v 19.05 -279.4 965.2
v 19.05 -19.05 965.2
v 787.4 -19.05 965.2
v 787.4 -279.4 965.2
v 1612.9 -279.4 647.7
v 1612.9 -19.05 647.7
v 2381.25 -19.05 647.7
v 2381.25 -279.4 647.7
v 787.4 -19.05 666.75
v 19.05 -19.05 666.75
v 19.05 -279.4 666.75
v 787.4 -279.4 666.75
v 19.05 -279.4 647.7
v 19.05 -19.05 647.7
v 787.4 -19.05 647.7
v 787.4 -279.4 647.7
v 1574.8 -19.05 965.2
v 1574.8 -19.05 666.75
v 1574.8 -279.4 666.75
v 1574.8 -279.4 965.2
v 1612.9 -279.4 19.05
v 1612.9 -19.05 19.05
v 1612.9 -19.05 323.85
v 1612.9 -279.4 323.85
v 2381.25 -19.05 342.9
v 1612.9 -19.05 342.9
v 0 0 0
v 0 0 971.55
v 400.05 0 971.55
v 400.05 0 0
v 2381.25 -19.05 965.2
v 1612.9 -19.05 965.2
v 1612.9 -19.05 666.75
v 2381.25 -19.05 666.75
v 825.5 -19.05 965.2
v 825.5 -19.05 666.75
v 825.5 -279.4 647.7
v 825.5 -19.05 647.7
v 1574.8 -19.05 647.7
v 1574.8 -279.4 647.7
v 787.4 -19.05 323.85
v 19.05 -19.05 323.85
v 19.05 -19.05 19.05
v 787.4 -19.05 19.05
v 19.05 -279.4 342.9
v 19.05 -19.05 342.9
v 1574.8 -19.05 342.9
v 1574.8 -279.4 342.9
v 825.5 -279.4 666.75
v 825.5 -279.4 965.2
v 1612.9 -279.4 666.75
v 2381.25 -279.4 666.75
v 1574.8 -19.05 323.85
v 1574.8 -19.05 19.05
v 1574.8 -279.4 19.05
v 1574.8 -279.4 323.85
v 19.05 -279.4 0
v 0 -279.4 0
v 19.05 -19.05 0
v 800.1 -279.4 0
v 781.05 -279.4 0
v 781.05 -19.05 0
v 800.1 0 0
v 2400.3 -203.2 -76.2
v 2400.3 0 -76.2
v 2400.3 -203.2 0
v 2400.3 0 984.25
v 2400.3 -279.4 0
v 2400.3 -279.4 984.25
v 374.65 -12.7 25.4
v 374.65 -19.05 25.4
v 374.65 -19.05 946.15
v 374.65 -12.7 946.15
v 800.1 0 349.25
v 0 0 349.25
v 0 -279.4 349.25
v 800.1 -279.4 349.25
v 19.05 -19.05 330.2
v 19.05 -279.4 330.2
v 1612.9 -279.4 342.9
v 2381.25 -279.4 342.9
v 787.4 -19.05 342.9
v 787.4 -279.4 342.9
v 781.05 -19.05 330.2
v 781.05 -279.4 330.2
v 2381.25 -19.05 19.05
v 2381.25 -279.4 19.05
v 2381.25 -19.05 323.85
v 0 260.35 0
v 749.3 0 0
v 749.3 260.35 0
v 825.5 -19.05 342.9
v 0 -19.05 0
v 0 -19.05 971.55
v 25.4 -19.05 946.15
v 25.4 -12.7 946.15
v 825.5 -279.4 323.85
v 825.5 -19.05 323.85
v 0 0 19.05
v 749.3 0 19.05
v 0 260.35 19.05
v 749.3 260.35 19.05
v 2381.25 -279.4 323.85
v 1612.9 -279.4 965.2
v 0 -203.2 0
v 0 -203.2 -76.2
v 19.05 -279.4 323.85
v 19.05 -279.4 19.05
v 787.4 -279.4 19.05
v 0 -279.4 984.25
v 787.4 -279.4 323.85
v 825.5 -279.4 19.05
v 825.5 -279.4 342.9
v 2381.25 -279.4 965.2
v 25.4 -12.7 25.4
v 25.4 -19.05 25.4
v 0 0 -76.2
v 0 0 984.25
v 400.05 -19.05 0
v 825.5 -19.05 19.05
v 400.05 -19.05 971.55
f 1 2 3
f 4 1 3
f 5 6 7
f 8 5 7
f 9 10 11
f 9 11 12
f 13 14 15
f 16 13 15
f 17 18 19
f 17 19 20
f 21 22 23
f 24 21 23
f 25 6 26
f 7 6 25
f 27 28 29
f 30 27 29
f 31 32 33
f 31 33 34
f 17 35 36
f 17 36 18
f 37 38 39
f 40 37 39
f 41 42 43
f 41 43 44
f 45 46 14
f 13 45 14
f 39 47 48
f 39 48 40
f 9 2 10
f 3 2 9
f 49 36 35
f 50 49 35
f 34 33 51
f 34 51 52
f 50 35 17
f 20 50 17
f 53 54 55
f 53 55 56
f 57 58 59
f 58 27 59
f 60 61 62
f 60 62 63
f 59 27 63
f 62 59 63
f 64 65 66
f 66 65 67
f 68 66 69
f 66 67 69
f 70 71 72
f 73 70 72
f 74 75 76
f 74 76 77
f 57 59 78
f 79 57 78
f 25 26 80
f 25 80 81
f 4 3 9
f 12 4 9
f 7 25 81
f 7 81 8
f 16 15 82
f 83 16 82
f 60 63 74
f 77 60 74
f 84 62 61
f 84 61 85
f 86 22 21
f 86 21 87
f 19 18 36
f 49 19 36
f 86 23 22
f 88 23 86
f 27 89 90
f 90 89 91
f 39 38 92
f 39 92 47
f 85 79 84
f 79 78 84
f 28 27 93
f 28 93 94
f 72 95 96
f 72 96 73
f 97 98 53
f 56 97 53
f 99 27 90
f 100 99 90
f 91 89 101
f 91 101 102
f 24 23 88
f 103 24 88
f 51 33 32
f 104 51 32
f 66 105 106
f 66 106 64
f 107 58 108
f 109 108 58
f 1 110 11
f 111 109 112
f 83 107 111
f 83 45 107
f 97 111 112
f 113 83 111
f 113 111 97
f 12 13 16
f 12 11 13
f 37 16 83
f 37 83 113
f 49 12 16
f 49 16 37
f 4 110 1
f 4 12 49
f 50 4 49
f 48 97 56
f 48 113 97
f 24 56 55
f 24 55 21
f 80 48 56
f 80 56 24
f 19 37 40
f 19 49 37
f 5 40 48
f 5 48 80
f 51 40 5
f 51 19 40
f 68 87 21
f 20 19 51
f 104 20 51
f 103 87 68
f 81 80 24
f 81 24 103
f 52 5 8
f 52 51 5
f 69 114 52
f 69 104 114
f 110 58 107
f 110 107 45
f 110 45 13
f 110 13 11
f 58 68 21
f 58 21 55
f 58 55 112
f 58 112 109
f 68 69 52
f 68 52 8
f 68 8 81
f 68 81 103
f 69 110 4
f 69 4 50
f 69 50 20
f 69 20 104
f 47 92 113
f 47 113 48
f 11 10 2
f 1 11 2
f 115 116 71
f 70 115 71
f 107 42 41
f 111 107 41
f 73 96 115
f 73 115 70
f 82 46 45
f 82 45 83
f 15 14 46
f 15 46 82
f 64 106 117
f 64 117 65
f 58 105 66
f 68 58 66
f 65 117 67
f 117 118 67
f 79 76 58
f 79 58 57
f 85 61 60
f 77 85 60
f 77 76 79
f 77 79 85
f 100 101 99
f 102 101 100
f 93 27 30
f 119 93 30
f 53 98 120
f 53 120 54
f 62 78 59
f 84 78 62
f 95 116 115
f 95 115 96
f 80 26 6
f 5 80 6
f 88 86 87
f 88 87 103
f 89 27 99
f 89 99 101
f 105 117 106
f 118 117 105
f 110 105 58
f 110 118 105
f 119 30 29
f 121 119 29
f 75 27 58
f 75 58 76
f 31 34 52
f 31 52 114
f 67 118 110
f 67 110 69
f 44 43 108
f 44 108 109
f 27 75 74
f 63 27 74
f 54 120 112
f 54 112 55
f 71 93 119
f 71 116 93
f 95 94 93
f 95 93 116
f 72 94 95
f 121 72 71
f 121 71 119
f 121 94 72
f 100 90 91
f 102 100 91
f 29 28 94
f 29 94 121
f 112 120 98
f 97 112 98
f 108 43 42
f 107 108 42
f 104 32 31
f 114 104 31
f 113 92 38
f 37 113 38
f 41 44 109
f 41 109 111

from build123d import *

# Parameters (mm, degrees)
F0_W      = 2400.3
F0_H      = 984.25
F1_DEPTH  = 279.4
F2_T      = -19.05
F3_W      = 2400.3
F3_H      = 203.2
F4_DEPTH  = 76.2
F5_W      = 400.05
F5_H      = 971.55
F6_DEPTH  = 19.05
F7_W      = 349.25
F7_H      = 920.75
F8_DEPTH  = 6.35
F9_W      = 38.1
F9_H      = 298.45
F9_H_2    = 19.05
F9_W_2    = 768.35
F9_W_3    = 749.3
F9_H_3    = 304.8
F10_DEPTH = 260.35
F11_W     = 749.3
F11_H     = 260.35
F12_DEPTH = 19.05
F13_W     = 800.1
F13_H     = 349.25
F14_DEPTH = 279.4
F15_T     = -19.05


with BuildPart() as f1:
    # F0 (on Front) → F1 (new body)
    with BuildSketch(Plane.XZ):
        with Locations((1200.15, 492.125)):
            Rectangle(F0_W, F0_H)
    extrude(amount=F1_DEPTH)

    # F2
    f2_openings = [f1.faces().sort_by_distance(p)[0] for p in [
        (1200.15, -279.4, 492.125),
    ]]
    offset(amount=F2_T, openings=f2_openings)

    # F3 (on face) → F4 (join)
    with BuildSketch(Plane(origin=(0, 0, 0), x_dir=(1, 0, 0), z_dir=(0, 0, -1))):
        with Locations((1200.15, 101.6)):
            Rectangle(F3_W, F3_H)
    extrude(amount=F4_DEPTH)

    # F9 (on face) → F10 (join, through all)
    with BuildSketch(Plane.XZ.offset(19.05)):
        with Locations((806.45, 815.975)):
            Rectangle(F9_W, F9_H)
        with Locations((806.45, 657.225)):
            Rectangle(F9_W, F9_H_2)
        with Locations((403.225, 657.225)):
            Rectangle(F9_W_2, F9_H_2)
        with Locations((1200.15, 657.225)):
            Rectangle(F9_W_3, F9_H_2)
        with Locations((806.45, 495.3)):
            Rectangle(F9_W, F9_H_3)
        with Locations((1593.85, 657.225)):
            Rectangle(F9_W, F9_H_2)
        with Locations((1593.85, 815.975)):
            Rectangle(F9_W, F9_H)
        with Locations((806.45, 333.375)):
            Rectangle(F9_W, F9_H_2)
        with Locations((403.225, 333.375)):
            Rectangle(F9_W_2, F9_H_2)
        with Locations((1200.15, 333.375)):
            Rectangle(F9_W_3, F9_H_2)
        with Locations((1593.85, 495.3)):
            Rectangle(F9_W, F9_H_3)
        with Locations((1997.075, 657.225)):
            Rectangle(F9_W_2, F9_H_2)
        with Locations((806.45, 171.45)):
            Rectangle(F9_W, F9_H_3)
        with Locations((1593.85, 333.375)):
            Rectangle(F9_W, F9_H_2)
        with Locations((1593.85, 171.45)):
            Rectangle(F9_W, F9_H_3)
        with Locations((1997.075, 333.375)):
            Rectangle(F9_W_2, F9_H_2)
    extrude(amount=F10_DEPTH)


with BuildPart() as f6:
    # F5 (on Front) → F6 (new body)
    with BuildSketch(Plane.XZ):
        with Locations((200.025, 485.775)):
            Rectangle(F5_W, F5_H)
    extrude(amount=F6_DEPTH)

    # F7 (on face) → F8 (cut)
    with BuildSketch(Plane.XZ.offset(19.05)):
        with Locations((200.025, 485.775)):
            Rectangle(F7_W, F7_H)
    extrude(amount=-F8_DEPTH, mode=Mode.SUBTRACT)


with BuildPart() as f12:
    # F11 (on Top) → F12 (new body)
    with BuildSketch(Plane.XY):
        with Locations((374.65, 130.175)):
            Rectangle(F11_W, F11_H)
    extrude(amount=F12_DEPTH)


with BuildPart() as f14:
    # F13 (on Front) → F14 (new body)
    with BuildSketch(Plane.XZ):
        with Locations((400.05, 174.625)):
            Rectangle(F13_W, F13_H)
    extrude(amount=F14_DEPTH)

    # F15
    f15_openings = [f14.faces().sort_by_distance(p)[0] for p in [
        (400.05, -279.4, 174.625),
        (400.05, -139.7, 0),
    ]]
    offset(amount=F15_T, openings=f15_openings)


solid = Compound([f1.part, f6.part, f12.part, f14.part])
